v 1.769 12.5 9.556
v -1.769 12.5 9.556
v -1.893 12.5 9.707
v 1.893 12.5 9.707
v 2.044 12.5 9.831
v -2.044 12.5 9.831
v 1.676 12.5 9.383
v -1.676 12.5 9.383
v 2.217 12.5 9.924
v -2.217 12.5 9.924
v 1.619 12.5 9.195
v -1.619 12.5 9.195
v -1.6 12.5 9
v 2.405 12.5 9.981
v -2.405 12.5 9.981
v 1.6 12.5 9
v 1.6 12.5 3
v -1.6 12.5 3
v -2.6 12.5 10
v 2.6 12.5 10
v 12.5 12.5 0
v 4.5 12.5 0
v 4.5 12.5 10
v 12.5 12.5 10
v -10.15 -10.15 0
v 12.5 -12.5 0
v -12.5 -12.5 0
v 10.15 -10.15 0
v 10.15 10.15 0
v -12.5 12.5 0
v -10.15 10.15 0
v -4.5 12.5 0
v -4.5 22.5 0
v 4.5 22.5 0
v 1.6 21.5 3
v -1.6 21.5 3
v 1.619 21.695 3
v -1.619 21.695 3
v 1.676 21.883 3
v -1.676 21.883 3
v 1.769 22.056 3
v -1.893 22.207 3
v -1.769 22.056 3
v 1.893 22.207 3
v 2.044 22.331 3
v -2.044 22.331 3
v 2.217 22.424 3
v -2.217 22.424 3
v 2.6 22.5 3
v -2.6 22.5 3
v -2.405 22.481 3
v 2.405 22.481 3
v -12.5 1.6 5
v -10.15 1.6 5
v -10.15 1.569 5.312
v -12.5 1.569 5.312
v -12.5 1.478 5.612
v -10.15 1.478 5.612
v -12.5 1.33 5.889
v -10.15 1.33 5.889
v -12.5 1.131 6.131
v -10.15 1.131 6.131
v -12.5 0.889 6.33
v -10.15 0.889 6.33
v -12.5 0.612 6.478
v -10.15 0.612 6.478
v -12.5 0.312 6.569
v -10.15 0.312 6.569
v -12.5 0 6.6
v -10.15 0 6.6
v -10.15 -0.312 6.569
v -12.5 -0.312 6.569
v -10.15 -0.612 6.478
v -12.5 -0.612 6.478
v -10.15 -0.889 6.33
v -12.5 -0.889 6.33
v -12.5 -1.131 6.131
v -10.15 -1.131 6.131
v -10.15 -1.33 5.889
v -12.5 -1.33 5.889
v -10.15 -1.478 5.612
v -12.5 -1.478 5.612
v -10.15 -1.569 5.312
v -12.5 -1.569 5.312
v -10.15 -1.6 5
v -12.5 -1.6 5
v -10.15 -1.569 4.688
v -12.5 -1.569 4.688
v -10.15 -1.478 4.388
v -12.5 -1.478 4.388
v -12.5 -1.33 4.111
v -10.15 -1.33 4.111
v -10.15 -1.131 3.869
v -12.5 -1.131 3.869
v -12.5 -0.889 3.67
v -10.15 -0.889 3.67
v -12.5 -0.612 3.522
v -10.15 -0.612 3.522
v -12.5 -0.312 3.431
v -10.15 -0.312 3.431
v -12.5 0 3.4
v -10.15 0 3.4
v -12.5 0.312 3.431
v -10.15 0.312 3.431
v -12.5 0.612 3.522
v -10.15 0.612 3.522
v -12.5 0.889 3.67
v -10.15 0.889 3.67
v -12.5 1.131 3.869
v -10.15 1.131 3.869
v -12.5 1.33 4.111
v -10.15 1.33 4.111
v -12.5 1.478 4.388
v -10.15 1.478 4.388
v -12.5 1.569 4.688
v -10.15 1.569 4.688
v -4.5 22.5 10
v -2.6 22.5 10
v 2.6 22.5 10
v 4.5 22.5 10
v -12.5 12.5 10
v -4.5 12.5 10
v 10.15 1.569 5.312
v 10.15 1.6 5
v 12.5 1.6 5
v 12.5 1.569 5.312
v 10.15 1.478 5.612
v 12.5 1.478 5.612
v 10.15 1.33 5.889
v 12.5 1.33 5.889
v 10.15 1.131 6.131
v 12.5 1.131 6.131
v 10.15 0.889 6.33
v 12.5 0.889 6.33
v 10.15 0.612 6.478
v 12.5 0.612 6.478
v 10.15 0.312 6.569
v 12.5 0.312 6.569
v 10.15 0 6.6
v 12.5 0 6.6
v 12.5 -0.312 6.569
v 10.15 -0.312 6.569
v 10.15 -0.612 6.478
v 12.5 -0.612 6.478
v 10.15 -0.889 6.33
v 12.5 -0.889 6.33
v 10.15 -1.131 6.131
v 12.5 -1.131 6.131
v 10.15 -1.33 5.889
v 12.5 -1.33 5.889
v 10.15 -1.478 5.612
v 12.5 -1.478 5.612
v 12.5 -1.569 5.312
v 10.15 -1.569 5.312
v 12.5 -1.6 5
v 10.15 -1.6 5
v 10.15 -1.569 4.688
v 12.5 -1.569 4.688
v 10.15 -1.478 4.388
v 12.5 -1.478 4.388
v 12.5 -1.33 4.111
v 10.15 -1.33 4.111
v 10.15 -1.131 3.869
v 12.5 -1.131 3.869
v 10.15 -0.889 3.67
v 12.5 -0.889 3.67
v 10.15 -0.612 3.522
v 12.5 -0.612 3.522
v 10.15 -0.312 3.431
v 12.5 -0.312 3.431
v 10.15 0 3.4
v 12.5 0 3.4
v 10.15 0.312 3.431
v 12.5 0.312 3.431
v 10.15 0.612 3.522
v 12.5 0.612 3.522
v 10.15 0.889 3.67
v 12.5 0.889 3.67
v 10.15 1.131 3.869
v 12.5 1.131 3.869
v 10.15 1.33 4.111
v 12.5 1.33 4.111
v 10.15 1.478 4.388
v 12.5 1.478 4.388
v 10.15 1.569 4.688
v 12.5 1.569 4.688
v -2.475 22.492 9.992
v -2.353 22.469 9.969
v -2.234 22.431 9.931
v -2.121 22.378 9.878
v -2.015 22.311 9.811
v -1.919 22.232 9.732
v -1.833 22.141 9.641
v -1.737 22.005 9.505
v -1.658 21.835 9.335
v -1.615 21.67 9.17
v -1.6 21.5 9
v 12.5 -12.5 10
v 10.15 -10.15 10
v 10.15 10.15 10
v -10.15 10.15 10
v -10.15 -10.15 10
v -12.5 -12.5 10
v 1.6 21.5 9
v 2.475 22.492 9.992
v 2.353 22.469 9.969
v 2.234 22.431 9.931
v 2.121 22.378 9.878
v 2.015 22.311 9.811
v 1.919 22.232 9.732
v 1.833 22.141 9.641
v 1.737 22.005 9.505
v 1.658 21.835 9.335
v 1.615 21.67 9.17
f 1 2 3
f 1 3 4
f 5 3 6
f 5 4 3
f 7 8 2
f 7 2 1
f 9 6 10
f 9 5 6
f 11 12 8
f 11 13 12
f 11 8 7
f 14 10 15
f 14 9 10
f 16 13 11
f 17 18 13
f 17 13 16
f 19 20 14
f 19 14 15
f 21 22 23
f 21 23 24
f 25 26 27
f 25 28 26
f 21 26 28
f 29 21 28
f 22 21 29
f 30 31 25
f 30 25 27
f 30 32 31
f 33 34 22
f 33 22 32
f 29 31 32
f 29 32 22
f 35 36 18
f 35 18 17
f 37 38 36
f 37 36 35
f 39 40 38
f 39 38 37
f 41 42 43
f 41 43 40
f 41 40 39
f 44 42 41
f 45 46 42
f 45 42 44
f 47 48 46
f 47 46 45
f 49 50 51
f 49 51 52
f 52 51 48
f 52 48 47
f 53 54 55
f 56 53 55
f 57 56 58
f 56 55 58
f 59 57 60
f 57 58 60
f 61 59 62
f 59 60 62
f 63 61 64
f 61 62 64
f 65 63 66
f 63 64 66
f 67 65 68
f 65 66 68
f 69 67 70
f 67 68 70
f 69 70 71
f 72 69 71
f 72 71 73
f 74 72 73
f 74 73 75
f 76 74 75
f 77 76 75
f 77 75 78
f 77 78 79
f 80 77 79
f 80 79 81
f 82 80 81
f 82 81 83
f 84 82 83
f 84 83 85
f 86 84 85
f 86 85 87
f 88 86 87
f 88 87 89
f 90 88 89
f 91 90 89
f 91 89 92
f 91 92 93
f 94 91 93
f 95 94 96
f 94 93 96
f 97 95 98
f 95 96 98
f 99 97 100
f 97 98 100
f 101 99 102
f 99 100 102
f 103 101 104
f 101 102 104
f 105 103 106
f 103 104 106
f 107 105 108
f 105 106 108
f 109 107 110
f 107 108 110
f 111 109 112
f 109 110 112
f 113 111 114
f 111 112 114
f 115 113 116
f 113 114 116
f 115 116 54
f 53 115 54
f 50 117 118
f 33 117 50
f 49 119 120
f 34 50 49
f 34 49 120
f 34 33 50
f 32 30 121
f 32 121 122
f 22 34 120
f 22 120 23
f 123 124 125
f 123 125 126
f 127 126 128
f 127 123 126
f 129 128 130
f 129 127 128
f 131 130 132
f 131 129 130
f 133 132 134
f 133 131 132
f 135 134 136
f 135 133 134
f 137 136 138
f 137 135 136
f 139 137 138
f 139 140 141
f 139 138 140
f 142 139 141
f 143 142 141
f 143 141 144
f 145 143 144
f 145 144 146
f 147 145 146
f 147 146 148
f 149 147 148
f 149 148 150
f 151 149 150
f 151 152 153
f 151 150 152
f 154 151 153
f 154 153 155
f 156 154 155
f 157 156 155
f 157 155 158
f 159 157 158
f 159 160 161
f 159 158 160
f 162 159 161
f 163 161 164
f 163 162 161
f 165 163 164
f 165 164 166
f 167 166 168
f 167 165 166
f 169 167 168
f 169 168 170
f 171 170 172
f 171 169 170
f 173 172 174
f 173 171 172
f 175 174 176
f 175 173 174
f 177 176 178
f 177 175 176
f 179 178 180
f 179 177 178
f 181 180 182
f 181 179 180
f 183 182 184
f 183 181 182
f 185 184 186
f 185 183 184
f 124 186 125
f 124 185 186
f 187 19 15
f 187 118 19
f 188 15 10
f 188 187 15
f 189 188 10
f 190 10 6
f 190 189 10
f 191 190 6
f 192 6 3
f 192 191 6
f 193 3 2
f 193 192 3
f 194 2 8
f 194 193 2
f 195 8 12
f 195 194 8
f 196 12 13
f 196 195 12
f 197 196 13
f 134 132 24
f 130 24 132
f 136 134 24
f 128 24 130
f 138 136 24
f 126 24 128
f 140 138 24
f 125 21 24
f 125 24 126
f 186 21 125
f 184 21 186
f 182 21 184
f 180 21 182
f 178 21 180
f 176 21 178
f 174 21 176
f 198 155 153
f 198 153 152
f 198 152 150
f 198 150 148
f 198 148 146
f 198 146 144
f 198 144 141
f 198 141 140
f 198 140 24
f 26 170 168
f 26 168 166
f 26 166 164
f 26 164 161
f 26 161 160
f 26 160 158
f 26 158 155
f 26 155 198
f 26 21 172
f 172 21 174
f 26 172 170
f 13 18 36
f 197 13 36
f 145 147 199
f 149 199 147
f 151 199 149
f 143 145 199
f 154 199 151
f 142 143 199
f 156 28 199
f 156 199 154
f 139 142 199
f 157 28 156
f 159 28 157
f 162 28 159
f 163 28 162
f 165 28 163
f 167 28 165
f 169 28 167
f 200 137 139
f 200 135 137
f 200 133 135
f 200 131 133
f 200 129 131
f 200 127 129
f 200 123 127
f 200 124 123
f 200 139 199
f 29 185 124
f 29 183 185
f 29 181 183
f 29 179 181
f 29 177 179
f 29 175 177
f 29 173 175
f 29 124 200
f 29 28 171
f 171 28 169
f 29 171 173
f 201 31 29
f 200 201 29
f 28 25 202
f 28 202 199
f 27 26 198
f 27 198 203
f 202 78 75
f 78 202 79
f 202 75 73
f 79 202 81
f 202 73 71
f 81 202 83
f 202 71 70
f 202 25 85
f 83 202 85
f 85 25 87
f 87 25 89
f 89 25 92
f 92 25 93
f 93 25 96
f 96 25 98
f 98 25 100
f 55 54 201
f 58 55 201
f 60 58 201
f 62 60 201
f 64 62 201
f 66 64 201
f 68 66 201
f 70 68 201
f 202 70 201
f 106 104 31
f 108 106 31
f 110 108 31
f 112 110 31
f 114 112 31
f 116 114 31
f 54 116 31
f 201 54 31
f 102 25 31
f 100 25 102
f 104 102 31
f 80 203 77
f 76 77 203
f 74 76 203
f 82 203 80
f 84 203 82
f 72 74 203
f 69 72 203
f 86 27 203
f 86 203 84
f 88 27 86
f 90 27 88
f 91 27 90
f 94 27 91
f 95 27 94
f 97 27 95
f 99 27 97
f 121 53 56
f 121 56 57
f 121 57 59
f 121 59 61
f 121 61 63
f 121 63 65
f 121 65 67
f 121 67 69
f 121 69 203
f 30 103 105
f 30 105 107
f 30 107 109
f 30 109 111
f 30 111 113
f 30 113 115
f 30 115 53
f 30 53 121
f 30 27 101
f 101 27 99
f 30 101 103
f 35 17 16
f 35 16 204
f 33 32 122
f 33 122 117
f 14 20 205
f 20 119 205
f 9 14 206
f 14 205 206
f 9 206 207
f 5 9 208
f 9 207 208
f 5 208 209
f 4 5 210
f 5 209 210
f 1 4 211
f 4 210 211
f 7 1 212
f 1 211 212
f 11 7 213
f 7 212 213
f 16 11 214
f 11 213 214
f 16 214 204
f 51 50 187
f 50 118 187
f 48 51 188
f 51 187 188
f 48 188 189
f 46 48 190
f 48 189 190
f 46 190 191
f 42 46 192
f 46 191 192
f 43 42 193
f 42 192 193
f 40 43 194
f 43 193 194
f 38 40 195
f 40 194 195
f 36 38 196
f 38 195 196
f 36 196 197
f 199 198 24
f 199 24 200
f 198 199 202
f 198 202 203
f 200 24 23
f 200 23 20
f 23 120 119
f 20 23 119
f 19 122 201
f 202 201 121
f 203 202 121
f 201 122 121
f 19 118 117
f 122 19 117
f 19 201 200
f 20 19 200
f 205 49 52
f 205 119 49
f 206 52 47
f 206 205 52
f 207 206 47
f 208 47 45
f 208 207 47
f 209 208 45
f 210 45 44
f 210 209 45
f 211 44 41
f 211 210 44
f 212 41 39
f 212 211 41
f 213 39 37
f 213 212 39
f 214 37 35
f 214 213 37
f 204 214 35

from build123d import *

# Parameters (mm, degrees)
SKETCH034_W          = 20.3
SKETCH034_H          = 20.3
PAD005_DEPTH         = 10
SKETCH035_W          = 3.2
SKETCH035_H          = 10
POCKET026_DEPTH      = 7
FILLET002_R          = 1
SKETCH036_R          = 1.6
POCKET027_DEPTH      = 12.501
POCKET027_DEPTH_BACK = 12.501


with BuildPart() as part:
    # Sketch034 → Pad005 (new body)
    with BuildSketch(Plane.XY):
        Polygon((-12.5, 12.5), (-4.5, 12.5), (-4.5, 22.5), (4.5, 22.5), (4.5, 12.5), (12.5, 12.5), (12.5, -12.5), (-12.5, -12.5), align=None)
        Rectangle(SKETCH034_W, SKETCH034_H, mode=Mode.SUBTRACT)
    extrude(amount=PAD005_DEPTH)

    # Sketch035 → Pocket026 (cut)
    with BuildSketch(Plane.XY.offset(3)):
        with Locations((0, 17.5)):
            Rectangle(SKETCH035_W, SKETCH035_H)
    extrude(amount=POCKET026_DEPTH, mode=Mode.SUBTRACT)

    # Fillet002
    fillet002_edges = [part.edges().sort_by_distance(p)[0] for p in [
        (1.6, 22.5, 6.5),
        (1.6, 17.5, 10),
        (-1.6, 22.5, 6.5),
        (-1.6, 17.5, 10),
    ]]
    fillet(fillet002_edges, radius=FILLET002_R)

    # Sketch036 → Pocket027 (cut, two sides)
    with BuildSketch(Plane.YZ) as pocket027_sk:
        with Locations((0, 5)):
            Circle(SKETCH036_R)
    extrude(amount=-POCKET027_DEPTH, mode=Mode.SUBTRACT)
    extrude(pocket027_sk.sketch, amount=POCKET027_DEPTH_BACK, mode=Mode.SUBTRACT)


solid = part.part
